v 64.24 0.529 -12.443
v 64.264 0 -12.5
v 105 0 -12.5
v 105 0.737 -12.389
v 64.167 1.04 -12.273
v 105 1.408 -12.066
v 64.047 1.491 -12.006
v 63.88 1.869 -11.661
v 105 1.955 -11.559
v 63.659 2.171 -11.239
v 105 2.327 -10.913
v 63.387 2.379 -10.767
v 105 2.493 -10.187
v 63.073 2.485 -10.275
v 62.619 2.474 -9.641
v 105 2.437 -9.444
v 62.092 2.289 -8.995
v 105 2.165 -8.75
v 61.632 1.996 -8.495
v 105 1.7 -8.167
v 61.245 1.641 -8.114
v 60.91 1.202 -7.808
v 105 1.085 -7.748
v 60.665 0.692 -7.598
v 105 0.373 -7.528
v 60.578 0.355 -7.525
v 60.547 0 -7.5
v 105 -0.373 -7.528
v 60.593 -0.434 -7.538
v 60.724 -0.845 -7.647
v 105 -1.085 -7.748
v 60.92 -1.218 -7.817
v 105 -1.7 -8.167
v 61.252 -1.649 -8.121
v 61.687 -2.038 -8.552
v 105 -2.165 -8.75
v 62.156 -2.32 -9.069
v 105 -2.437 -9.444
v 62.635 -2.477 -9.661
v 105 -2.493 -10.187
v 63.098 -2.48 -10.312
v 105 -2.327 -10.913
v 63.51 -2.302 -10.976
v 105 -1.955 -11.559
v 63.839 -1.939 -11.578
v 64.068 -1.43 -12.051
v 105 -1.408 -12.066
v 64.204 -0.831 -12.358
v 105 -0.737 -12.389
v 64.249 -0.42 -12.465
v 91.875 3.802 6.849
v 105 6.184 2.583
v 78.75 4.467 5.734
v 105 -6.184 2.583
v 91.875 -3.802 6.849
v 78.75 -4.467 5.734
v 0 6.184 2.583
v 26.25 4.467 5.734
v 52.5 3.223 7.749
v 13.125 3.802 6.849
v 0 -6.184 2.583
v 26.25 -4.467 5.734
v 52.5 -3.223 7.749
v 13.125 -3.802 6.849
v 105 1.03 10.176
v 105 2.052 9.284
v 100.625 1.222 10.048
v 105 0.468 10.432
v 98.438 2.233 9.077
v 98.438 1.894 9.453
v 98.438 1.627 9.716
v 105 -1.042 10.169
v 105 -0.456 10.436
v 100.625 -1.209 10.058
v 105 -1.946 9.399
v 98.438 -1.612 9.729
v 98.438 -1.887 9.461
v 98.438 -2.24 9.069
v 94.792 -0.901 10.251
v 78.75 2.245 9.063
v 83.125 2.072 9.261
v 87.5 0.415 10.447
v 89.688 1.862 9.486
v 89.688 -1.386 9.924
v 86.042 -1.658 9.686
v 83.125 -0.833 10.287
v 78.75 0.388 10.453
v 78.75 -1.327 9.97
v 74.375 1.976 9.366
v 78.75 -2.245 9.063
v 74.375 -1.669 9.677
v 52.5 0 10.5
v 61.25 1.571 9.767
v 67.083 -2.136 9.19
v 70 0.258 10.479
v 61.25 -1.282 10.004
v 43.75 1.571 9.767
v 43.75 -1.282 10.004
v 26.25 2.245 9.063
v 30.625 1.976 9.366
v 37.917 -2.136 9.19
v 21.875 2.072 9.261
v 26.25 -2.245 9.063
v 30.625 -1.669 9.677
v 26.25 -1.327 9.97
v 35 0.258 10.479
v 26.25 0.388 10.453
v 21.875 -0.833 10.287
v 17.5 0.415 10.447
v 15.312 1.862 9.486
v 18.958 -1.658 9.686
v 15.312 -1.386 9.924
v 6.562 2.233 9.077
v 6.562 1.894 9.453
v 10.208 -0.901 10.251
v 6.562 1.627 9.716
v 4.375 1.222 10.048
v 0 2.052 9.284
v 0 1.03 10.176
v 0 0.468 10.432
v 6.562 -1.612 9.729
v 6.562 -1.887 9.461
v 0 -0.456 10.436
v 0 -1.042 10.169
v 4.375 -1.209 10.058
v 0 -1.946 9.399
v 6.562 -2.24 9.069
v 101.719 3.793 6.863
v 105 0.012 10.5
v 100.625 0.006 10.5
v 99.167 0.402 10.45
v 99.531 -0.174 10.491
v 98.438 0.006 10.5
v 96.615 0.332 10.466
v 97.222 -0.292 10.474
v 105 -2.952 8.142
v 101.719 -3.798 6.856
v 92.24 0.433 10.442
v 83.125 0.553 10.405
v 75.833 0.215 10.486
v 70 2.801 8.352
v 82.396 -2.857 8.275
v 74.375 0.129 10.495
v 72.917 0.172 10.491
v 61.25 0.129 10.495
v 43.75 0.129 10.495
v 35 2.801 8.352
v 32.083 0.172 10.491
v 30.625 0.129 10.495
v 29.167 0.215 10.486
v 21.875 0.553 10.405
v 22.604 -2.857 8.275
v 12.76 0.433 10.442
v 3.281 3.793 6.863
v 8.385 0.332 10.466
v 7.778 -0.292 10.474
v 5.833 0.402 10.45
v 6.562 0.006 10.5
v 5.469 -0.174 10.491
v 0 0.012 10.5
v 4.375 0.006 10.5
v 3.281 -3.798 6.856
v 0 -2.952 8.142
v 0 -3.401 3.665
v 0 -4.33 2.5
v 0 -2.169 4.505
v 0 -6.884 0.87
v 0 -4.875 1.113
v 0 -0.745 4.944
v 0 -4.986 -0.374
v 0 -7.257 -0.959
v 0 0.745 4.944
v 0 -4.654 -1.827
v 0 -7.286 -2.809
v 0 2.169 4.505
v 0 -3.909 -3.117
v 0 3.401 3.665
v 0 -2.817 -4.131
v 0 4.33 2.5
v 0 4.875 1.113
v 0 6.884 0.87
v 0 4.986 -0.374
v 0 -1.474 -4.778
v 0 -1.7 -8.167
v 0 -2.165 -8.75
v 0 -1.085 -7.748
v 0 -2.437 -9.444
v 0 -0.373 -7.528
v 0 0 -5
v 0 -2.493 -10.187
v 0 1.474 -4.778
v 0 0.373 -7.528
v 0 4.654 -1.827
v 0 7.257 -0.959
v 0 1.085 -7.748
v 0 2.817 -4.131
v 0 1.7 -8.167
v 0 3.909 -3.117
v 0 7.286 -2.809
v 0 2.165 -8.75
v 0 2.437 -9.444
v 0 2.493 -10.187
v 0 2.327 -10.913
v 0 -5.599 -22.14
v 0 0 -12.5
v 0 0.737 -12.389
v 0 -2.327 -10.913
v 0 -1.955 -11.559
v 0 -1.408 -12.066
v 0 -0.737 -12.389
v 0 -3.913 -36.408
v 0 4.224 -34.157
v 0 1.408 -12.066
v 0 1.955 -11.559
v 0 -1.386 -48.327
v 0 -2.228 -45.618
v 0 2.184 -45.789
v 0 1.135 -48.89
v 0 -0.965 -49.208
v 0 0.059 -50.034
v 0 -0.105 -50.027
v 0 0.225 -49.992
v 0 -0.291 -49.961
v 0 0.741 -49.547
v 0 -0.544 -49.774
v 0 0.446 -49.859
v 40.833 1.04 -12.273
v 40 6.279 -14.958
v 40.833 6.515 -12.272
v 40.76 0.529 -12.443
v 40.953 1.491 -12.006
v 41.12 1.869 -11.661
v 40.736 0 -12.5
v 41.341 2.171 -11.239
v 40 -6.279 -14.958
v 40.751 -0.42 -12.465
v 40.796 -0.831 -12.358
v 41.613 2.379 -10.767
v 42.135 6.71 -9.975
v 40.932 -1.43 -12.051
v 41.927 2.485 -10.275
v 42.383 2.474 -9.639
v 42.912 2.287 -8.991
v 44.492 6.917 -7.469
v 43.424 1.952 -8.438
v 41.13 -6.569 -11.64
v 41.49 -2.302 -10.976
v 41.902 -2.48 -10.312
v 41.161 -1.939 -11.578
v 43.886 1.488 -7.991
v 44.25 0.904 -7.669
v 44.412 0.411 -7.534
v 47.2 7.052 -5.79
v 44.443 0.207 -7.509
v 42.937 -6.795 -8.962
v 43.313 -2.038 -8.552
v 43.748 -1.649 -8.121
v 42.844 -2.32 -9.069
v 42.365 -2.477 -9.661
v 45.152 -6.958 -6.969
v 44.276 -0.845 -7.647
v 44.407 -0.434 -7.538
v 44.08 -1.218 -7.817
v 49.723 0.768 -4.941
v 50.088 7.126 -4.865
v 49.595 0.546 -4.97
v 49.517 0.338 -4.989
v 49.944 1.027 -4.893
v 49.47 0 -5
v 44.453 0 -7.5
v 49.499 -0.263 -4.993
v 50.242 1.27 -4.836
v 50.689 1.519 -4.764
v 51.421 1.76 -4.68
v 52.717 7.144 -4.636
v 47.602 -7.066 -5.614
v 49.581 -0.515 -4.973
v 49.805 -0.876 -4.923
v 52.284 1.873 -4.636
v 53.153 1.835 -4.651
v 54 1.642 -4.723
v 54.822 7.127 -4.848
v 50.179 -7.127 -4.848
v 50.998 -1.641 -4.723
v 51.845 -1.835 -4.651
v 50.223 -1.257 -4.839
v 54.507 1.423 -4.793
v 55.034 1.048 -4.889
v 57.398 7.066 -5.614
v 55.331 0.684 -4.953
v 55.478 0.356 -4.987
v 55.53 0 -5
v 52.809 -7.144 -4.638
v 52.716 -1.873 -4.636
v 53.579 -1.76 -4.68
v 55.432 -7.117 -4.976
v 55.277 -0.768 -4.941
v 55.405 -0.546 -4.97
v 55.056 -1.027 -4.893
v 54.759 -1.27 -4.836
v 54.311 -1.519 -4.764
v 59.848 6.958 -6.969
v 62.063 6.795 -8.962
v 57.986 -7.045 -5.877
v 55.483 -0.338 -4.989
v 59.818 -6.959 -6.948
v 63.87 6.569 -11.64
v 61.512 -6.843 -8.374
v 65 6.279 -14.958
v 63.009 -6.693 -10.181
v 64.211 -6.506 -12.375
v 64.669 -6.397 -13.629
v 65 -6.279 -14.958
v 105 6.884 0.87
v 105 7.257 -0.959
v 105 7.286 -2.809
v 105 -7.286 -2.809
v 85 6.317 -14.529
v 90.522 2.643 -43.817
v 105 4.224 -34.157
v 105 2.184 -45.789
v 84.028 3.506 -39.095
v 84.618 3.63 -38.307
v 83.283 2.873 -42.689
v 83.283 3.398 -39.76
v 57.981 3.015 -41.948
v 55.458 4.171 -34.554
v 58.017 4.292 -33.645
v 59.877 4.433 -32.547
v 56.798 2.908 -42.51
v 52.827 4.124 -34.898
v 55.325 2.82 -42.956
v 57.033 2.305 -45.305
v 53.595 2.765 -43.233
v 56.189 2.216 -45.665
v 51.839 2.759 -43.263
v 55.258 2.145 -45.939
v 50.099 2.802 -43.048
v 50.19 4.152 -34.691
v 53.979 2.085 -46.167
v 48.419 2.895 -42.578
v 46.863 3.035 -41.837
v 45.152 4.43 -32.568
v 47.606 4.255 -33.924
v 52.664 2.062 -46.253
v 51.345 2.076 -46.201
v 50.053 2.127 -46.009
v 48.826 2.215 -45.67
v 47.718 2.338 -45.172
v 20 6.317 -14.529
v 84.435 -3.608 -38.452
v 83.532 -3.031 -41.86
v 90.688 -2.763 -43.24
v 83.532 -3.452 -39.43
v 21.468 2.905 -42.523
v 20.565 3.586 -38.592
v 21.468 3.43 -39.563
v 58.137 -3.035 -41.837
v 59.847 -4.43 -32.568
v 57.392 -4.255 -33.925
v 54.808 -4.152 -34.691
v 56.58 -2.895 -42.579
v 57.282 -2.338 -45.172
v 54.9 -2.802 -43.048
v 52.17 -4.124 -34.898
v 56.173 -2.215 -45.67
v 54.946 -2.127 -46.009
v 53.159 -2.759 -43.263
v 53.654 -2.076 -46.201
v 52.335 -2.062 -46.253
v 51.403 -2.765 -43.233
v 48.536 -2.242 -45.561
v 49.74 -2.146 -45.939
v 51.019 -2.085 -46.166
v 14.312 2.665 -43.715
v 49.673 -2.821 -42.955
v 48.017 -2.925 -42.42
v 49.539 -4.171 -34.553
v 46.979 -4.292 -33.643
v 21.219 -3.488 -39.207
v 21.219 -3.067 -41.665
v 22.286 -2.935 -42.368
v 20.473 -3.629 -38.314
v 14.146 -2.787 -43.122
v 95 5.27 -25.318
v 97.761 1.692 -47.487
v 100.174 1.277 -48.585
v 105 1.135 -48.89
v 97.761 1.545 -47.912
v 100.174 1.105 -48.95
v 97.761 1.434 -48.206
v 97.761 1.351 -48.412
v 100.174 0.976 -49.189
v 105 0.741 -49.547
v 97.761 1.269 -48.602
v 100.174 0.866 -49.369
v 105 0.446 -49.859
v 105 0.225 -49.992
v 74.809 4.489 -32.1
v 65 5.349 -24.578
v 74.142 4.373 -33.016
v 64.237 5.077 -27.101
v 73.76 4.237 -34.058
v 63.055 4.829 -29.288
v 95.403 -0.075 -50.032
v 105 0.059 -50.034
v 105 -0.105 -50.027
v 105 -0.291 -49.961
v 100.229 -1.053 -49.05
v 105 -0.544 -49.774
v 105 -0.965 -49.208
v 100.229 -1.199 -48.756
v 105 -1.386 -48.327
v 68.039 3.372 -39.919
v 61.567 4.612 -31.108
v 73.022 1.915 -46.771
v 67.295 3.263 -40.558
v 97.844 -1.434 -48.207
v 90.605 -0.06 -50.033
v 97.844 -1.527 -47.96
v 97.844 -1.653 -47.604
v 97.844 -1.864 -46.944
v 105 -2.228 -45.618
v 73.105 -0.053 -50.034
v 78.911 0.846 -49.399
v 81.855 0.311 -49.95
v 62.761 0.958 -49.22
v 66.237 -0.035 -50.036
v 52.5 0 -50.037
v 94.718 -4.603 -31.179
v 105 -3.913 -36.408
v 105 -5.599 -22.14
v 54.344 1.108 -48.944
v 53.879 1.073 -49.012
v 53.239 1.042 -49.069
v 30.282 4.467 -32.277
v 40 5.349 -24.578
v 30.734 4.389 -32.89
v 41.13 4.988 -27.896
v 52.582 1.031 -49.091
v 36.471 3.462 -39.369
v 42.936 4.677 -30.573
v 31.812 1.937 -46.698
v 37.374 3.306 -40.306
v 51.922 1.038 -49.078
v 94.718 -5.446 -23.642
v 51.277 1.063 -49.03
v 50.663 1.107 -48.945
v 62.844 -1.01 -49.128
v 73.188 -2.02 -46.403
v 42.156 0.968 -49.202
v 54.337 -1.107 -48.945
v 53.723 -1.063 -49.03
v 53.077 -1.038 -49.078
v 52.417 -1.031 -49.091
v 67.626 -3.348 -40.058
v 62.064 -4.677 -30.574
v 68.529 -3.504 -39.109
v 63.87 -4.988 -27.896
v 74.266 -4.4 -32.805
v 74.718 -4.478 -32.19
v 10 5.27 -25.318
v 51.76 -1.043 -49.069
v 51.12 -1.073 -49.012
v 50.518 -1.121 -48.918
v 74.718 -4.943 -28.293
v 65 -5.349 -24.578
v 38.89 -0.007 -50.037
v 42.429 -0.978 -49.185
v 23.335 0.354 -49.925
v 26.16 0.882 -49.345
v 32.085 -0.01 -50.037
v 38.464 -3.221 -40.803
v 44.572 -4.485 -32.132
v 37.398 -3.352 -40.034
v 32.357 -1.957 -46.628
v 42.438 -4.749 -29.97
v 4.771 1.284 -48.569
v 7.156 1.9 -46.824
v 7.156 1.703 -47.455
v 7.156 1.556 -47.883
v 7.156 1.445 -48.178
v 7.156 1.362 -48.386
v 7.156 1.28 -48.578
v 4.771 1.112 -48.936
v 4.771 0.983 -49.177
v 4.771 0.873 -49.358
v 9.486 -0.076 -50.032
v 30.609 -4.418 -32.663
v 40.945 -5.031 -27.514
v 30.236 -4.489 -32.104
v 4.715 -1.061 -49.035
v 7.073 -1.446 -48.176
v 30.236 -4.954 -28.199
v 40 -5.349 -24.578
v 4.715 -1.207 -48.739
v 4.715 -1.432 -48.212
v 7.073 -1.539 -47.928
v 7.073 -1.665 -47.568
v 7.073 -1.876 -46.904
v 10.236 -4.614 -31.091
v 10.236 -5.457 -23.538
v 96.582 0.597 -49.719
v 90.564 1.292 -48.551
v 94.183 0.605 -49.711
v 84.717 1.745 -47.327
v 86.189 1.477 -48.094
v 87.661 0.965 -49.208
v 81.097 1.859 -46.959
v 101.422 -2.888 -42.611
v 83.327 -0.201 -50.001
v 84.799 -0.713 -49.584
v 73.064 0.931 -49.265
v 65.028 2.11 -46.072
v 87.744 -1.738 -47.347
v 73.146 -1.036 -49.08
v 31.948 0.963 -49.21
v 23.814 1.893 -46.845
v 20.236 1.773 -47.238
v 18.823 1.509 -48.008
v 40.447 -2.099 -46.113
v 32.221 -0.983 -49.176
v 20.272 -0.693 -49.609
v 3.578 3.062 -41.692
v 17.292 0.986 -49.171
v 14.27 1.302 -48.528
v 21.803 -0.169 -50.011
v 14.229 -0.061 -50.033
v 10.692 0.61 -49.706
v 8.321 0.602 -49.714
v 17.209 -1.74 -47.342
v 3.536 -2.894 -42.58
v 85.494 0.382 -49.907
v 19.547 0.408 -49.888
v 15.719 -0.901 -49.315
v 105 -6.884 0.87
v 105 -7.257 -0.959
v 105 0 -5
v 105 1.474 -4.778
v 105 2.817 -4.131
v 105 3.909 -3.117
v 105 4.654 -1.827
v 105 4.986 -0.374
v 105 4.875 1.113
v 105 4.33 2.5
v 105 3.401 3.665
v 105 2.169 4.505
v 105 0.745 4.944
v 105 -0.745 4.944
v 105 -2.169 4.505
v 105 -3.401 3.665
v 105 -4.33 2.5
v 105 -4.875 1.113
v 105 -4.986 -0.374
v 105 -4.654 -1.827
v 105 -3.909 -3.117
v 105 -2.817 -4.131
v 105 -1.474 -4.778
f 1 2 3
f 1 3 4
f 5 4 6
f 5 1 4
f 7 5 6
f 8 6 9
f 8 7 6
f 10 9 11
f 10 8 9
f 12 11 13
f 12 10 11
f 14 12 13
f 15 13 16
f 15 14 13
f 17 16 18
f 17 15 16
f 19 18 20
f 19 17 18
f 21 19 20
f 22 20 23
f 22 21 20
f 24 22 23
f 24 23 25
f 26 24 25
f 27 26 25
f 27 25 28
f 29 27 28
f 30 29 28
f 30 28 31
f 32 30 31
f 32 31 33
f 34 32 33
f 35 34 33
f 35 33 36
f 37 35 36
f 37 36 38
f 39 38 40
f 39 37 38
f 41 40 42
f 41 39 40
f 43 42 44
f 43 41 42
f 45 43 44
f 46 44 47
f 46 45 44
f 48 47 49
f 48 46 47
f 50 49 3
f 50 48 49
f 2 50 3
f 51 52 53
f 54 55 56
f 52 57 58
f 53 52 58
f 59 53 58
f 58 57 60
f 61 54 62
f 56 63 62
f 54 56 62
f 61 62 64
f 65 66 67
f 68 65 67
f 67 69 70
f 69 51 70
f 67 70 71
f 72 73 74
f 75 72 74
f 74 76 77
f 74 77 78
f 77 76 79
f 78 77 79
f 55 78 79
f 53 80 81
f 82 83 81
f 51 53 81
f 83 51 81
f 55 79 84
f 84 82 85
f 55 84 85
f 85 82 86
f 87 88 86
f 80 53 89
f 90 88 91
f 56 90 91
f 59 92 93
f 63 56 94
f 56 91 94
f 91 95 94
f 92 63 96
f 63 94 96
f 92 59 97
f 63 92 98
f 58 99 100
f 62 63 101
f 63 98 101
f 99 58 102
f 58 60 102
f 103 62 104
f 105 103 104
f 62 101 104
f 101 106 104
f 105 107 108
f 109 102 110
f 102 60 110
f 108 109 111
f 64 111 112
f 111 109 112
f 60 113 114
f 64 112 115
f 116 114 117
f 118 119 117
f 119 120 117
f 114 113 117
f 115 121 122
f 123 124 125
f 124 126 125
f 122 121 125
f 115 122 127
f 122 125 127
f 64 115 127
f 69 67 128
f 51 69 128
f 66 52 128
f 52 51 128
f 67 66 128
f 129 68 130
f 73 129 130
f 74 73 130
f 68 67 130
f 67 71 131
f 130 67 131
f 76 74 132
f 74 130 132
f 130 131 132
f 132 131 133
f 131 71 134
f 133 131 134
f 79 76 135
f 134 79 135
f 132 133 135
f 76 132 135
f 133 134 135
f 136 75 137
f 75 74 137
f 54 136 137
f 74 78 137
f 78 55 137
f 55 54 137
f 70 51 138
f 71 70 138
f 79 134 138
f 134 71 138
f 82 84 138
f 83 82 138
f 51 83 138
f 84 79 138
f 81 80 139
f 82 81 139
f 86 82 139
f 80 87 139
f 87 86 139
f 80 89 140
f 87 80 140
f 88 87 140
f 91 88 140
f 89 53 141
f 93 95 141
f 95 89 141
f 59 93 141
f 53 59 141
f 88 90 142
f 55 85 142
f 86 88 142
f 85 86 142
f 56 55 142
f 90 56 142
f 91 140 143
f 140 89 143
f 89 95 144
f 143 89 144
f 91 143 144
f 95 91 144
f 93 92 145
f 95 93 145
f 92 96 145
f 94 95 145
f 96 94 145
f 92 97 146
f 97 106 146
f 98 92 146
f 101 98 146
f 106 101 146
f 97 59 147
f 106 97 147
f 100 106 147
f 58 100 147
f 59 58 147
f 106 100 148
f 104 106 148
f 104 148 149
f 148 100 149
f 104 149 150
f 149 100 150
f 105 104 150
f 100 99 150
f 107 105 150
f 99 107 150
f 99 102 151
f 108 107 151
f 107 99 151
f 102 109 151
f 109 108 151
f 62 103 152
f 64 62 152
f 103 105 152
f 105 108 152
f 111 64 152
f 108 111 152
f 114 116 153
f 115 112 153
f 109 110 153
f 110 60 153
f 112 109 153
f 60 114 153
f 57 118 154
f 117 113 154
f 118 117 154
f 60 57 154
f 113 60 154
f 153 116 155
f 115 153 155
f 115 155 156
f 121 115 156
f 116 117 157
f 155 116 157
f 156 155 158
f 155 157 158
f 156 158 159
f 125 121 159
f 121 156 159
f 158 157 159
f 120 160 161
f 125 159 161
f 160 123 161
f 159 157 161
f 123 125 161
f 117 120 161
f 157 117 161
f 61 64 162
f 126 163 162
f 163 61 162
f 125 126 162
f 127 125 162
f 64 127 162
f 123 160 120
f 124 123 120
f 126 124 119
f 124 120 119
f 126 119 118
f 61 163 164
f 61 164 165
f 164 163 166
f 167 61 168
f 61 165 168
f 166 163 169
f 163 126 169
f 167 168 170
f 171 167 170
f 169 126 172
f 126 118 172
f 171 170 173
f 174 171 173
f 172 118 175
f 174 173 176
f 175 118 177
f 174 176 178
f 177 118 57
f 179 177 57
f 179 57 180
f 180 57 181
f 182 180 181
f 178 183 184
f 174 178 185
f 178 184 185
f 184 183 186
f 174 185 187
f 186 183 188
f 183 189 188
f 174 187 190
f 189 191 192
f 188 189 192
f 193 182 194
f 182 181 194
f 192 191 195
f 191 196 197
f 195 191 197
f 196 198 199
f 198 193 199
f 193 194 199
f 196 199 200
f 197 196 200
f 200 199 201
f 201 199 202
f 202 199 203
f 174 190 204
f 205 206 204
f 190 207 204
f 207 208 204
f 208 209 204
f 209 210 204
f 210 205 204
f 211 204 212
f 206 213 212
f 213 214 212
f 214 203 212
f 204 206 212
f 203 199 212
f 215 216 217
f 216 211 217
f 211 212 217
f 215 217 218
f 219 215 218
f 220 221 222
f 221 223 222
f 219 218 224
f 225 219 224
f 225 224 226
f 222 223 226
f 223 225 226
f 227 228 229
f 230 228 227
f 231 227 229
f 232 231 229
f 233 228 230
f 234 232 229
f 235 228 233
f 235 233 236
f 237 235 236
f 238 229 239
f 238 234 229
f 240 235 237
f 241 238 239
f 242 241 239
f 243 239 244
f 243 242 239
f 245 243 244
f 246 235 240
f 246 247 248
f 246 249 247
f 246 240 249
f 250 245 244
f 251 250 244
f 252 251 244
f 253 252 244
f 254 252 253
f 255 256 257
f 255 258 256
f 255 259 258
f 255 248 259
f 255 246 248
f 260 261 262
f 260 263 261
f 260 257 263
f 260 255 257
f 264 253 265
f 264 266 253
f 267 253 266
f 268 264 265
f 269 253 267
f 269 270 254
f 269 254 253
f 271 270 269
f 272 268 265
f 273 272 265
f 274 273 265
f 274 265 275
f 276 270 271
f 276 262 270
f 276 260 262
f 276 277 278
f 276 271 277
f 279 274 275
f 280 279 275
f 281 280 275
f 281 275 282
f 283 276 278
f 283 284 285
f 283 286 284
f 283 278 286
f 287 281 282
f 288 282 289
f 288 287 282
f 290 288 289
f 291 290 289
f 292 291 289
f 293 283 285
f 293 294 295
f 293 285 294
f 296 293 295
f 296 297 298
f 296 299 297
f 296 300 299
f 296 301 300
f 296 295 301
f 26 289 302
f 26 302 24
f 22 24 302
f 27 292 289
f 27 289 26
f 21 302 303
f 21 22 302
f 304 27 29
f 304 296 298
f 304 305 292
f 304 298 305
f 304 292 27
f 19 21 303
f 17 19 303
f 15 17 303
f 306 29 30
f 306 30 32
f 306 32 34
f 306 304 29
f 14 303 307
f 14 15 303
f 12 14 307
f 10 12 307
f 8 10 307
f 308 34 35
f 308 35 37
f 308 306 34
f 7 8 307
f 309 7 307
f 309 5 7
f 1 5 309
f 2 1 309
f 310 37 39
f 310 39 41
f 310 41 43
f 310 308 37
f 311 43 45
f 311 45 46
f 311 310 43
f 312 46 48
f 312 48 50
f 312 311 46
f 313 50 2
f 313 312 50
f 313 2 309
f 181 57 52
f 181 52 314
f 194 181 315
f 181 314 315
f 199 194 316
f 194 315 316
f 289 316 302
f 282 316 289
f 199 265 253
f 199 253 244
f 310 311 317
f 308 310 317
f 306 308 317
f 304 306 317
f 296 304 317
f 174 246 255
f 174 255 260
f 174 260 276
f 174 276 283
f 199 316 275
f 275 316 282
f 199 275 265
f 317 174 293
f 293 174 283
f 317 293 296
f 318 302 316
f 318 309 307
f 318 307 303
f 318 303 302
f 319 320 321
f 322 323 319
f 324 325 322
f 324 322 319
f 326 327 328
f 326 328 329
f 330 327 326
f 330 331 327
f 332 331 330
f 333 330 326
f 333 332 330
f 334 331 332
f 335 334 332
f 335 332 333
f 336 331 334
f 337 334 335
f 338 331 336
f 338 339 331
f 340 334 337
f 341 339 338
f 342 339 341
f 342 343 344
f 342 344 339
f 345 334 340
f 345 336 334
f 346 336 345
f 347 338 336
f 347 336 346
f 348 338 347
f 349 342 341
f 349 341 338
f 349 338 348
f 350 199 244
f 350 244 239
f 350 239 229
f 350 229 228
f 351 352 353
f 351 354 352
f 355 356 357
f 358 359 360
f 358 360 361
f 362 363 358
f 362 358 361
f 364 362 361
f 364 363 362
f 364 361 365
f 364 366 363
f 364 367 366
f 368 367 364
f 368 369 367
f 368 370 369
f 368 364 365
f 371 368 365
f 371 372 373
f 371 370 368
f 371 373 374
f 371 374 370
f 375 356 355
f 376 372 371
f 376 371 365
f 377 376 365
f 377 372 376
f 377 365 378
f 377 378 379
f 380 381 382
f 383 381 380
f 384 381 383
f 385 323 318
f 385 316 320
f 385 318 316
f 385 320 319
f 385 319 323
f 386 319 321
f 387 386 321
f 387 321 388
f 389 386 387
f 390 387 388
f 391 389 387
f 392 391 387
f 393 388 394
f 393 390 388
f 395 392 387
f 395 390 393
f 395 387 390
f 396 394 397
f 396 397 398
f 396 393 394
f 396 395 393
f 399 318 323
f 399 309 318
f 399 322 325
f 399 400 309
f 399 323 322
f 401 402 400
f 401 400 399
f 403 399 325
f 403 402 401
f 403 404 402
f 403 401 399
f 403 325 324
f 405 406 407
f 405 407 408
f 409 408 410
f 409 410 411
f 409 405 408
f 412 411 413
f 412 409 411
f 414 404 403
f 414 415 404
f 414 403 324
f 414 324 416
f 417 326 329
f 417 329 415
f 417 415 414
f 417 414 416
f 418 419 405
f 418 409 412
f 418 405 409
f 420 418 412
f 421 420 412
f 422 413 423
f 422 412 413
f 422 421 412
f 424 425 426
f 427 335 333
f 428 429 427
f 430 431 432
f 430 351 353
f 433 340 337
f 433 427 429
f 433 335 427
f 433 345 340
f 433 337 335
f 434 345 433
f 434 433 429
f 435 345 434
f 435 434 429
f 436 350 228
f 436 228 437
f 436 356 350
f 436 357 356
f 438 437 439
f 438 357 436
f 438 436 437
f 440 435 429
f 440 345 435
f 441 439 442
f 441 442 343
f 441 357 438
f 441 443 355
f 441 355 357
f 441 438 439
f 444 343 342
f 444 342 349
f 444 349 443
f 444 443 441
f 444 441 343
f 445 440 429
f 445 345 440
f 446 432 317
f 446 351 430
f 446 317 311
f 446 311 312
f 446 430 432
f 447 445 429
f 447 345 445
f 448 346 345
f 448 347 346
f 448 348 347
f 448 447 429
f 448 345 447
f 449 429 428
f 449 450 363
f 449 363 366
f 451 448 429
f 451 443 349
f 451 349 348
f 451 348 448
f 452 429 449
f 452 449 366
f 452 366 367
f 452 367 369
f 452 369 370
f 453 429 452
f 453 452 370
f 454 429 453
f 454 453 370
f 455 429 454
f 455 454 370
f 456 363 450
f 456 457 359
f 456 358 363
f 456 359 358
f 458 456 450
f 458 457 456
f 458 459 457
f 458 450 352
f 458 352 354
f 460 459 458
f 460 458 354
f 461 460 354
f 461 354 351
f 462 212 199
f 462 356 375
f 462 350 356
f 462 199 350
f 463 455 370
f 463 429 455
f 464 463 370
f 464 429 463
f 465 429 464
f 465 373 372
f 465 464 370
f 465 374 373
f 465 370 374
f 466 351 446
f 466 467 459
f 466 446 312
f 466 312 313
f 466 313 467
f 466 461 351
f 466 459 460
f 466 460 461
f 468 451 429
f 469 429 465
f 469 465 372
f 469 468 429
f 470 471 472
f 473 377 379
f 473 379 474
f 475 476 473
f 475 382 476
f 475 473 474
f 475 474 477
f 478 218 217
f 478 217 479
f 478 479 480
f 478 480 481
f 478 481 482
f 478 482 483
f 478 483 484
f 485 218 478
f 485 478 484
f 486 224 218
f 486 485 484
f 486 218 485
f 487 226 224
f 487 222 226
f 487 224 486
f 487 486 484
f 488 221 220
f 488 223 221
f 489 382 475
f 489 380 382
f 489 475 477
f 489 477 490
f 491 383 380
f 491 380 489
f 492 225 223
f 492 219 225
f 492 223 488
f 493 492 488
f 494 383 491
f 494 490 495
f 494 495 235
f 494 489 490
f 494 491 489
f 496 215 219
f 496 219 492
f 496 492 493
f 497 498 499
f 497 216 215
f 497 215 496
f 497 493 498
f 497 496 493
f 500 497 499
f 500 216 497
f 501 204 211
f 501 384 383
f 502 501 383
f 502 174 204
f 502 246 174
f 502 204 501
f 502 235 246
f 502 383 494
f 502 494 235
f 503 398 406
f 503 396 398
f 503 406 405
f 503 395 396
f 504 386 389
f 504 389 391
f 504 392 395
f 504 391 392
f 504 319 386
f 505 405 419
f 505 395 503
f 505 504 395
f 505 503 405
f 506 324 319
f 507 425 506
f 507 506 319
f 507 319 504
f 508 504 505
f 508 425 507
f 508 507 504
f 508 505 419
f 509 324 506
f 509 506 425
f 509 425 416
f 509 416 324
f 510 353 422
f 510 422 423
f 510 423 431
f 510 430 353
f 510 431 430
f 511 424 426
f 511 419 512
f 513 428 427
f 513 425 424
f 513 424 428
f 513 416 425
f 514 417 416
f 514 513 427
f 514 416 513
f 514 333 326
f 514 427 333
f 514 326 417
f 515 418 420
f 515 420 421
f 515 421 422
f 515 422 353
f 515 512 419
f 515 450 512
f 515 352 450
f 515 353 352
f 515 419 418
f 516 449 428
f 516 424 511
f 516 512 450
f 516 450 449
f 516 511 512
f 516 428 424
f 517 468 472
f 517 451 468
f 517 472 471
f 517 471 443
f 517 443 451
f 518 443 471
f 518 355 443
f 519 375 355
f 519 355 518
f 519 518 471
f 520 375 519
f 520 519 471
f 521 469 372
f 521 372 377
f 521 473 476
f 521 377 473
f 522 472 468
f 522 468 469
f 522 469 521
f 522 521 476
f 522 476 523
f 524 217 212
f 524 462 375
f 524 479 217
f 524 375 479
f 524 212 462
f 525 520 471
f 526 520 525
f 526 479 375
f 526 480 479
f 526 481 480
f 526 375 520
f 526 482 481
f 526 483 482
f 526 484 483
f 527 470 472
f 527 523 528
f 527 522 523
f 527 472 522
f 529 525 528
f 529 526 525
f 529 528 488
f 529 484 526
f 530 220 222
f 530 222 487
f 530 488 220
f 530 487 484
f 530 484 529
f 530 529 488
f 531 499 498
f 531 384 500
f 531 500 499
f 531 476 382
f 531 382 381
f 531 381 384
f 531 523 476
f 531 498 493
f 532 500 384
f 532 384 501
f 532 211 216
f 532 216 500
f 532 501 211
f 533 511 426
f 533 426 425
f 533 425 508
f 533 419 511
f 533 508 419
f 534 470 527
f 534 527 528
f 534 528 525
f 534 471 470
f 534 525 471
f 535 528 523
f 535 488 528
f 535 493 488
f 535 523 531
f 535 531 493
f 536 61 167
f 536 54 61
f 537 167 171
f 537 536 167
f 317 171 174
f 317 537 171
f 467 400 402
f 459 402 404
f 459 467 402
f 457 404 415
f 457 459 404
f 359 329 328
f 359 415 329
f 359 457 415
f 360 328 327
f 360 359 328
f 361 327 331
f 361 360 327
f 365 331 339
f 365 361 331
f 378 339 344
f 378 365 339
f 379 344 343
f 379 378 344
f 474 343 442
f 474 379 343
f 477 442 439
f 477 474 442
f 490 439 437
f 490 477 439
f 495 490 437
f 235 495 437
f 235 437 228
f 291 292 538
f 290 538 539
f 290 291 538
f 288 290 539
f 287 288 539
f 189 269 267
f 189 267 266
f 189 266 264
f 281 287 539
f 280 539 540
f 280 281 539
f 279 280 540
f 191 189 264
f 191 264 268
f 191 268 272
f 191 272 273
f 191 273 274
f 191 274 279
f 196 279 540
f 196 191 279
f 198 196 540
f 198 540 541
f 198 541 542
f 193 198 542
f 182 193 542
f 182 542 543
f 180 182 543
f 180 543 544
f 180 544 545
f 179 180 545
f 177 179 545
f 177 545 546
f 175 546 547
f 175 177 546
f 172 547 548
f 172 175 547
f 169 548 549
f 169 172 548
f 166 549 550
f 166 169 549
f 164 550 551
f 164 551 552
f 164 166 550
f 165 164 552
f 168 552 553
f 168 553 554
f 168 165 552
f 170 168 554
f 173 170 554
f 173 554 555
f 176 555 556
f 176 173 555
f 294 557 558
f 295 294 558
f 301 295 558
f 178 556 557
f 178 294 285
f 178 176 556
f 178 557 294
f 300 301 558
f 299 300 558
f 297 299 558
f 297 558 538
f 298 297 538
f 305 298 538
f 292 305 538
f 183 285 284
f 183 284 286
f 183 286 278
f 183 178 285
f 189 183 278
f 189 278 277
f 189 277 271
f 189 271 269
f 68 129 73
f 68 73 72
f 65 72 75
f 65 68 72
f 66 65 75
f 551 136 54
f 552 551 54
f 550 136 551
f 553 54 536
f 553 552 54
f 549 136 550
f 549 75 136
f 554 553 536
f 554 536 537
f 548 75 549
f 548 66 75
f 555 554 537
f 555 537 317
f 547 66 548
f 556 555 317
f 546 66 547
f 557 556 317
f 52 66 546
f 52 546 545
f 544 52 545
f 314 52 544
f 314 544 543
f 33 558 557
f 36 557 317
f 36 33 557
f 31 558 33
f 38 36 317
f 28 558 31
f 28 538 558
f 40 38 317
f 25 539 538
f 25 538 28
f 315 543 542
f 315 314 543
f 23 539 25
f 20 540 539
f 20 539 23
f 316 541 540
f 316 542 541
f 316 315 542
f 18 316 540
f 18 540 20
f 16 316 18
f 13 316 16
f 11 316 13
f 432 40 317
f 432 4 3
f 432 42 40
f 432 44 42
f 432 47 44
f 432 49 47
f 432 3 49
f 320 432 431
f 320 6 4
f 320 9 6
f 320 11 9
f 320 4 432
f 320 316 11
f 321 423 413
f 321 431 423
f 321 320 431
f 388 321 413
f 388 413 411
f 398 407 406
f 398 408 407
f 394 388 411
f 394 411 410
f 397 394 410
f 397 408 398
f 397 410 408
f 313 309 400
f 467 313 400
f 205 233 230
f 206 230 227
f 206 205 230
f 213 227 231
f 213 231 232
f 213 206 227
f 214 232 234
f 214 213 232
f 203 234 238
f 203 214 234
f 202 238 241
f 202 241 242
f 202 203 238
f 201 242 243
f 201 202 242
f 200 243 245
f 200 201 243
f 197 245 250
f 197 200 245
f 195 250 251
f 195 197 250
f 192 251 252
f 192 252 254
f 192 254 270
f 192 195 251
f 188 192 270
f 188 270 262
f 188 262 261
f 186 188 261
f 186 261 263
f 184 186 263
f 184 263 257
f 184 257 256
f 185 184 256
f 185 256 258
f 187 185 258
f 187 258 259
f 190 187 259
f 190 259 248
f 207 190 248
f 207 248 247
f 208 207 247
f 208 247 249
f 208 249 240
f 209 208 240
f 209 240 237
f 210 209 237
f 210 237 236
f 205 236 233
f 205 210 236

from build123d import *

# Parameters (mm, degrees)
SKETCH1_R               = 5
SKETCH1_R_2             = 2.5
BOSS_EXTRUDE1_DEPTH     = 105
FILLET1_R               = 10
CUT_EXTRUDE1_DEPTH      = 117.542660484
CUT_EXTRUDE1_DEPTH_BACK = 117.542660484


with BuildPart() as part:
    # Sketch1 → Boss-Extrude1 (new body)
    with BuildSketch(Plane(origin=(0, 0, 0), x_dir=(0, 0, -1), z_dir=(1, 0, 0))):
        with BuildLine():
            add(Edge.make_bspline(
                [(3.73e-07, 7.5), (-15, 0), (-3.73e-07, -7.5)],
                knots=[0, 0, 0, 1, 1, 1], degree=2, weights=[1, 2.333333333, 1]))
            add(Edge.make_bspline(
                [(3.73e-07, 7.5), (100, 0), (-3.73e-07, -7.5)],
                knots=[0, 0, 0, 1, 1, 1], degree=2, weights=[1, 1.001467765, 1]))
        make_face()
        Circle(SKETCH1_R, mode=Mode.SUBTRACT)
        with Locations((10, 0)):
            Circle(SKETCH1_R_2, mode=Mode.SUBTRACT)
    extrude(amount=BOSS_EXTRUDE1_DEPTH)

    # Fillet1
    fillet1_edges = [part.edges().sort_by_distance(p)[0] for p in [
        (52.5, 7.5, -3.73e-07),
        (52.5, -7.5, 3.73e-07),
    ]]
    fillet(fillet1_edges, radius=FILLET1_R)

    # Sketch2 → Cut-Extrude1 (cut, two sides)
    with BuildSketch(Plane(origin=(0, 0, 0), x_dir=(1, 0, 0), z_dir=(0, 1, 0))) as cut_extrude1_sk:
        with BuildLine():
            ThreePointArc((65, 24.578179161), (52.5, 34.902500415), (40, 24.578179161))
            Line((40, 24.578179161), (40, 19.76833361))
            Line((40, 19.76833361), (40, 14.958488059))
            ThreePointArc((40, 14.958488059), (52.5, 4.634166805), (65, 14.958488059))
            Line((65, 14.958488059), (65, 19.76833361))
            Line((65, 19.76833361), (65, 24.578179161))
        make_face()
    extrude(amount=CUT_EXTRUDE1_DEPTH, mode=Mode.SUBTRACT)
    extrude(cut_extrude1_sk.sketch, amount=-CUT_EXTRUDE1_DEPTH_BACK, mode=Mode.SUBTRACT)


solid = part.part
